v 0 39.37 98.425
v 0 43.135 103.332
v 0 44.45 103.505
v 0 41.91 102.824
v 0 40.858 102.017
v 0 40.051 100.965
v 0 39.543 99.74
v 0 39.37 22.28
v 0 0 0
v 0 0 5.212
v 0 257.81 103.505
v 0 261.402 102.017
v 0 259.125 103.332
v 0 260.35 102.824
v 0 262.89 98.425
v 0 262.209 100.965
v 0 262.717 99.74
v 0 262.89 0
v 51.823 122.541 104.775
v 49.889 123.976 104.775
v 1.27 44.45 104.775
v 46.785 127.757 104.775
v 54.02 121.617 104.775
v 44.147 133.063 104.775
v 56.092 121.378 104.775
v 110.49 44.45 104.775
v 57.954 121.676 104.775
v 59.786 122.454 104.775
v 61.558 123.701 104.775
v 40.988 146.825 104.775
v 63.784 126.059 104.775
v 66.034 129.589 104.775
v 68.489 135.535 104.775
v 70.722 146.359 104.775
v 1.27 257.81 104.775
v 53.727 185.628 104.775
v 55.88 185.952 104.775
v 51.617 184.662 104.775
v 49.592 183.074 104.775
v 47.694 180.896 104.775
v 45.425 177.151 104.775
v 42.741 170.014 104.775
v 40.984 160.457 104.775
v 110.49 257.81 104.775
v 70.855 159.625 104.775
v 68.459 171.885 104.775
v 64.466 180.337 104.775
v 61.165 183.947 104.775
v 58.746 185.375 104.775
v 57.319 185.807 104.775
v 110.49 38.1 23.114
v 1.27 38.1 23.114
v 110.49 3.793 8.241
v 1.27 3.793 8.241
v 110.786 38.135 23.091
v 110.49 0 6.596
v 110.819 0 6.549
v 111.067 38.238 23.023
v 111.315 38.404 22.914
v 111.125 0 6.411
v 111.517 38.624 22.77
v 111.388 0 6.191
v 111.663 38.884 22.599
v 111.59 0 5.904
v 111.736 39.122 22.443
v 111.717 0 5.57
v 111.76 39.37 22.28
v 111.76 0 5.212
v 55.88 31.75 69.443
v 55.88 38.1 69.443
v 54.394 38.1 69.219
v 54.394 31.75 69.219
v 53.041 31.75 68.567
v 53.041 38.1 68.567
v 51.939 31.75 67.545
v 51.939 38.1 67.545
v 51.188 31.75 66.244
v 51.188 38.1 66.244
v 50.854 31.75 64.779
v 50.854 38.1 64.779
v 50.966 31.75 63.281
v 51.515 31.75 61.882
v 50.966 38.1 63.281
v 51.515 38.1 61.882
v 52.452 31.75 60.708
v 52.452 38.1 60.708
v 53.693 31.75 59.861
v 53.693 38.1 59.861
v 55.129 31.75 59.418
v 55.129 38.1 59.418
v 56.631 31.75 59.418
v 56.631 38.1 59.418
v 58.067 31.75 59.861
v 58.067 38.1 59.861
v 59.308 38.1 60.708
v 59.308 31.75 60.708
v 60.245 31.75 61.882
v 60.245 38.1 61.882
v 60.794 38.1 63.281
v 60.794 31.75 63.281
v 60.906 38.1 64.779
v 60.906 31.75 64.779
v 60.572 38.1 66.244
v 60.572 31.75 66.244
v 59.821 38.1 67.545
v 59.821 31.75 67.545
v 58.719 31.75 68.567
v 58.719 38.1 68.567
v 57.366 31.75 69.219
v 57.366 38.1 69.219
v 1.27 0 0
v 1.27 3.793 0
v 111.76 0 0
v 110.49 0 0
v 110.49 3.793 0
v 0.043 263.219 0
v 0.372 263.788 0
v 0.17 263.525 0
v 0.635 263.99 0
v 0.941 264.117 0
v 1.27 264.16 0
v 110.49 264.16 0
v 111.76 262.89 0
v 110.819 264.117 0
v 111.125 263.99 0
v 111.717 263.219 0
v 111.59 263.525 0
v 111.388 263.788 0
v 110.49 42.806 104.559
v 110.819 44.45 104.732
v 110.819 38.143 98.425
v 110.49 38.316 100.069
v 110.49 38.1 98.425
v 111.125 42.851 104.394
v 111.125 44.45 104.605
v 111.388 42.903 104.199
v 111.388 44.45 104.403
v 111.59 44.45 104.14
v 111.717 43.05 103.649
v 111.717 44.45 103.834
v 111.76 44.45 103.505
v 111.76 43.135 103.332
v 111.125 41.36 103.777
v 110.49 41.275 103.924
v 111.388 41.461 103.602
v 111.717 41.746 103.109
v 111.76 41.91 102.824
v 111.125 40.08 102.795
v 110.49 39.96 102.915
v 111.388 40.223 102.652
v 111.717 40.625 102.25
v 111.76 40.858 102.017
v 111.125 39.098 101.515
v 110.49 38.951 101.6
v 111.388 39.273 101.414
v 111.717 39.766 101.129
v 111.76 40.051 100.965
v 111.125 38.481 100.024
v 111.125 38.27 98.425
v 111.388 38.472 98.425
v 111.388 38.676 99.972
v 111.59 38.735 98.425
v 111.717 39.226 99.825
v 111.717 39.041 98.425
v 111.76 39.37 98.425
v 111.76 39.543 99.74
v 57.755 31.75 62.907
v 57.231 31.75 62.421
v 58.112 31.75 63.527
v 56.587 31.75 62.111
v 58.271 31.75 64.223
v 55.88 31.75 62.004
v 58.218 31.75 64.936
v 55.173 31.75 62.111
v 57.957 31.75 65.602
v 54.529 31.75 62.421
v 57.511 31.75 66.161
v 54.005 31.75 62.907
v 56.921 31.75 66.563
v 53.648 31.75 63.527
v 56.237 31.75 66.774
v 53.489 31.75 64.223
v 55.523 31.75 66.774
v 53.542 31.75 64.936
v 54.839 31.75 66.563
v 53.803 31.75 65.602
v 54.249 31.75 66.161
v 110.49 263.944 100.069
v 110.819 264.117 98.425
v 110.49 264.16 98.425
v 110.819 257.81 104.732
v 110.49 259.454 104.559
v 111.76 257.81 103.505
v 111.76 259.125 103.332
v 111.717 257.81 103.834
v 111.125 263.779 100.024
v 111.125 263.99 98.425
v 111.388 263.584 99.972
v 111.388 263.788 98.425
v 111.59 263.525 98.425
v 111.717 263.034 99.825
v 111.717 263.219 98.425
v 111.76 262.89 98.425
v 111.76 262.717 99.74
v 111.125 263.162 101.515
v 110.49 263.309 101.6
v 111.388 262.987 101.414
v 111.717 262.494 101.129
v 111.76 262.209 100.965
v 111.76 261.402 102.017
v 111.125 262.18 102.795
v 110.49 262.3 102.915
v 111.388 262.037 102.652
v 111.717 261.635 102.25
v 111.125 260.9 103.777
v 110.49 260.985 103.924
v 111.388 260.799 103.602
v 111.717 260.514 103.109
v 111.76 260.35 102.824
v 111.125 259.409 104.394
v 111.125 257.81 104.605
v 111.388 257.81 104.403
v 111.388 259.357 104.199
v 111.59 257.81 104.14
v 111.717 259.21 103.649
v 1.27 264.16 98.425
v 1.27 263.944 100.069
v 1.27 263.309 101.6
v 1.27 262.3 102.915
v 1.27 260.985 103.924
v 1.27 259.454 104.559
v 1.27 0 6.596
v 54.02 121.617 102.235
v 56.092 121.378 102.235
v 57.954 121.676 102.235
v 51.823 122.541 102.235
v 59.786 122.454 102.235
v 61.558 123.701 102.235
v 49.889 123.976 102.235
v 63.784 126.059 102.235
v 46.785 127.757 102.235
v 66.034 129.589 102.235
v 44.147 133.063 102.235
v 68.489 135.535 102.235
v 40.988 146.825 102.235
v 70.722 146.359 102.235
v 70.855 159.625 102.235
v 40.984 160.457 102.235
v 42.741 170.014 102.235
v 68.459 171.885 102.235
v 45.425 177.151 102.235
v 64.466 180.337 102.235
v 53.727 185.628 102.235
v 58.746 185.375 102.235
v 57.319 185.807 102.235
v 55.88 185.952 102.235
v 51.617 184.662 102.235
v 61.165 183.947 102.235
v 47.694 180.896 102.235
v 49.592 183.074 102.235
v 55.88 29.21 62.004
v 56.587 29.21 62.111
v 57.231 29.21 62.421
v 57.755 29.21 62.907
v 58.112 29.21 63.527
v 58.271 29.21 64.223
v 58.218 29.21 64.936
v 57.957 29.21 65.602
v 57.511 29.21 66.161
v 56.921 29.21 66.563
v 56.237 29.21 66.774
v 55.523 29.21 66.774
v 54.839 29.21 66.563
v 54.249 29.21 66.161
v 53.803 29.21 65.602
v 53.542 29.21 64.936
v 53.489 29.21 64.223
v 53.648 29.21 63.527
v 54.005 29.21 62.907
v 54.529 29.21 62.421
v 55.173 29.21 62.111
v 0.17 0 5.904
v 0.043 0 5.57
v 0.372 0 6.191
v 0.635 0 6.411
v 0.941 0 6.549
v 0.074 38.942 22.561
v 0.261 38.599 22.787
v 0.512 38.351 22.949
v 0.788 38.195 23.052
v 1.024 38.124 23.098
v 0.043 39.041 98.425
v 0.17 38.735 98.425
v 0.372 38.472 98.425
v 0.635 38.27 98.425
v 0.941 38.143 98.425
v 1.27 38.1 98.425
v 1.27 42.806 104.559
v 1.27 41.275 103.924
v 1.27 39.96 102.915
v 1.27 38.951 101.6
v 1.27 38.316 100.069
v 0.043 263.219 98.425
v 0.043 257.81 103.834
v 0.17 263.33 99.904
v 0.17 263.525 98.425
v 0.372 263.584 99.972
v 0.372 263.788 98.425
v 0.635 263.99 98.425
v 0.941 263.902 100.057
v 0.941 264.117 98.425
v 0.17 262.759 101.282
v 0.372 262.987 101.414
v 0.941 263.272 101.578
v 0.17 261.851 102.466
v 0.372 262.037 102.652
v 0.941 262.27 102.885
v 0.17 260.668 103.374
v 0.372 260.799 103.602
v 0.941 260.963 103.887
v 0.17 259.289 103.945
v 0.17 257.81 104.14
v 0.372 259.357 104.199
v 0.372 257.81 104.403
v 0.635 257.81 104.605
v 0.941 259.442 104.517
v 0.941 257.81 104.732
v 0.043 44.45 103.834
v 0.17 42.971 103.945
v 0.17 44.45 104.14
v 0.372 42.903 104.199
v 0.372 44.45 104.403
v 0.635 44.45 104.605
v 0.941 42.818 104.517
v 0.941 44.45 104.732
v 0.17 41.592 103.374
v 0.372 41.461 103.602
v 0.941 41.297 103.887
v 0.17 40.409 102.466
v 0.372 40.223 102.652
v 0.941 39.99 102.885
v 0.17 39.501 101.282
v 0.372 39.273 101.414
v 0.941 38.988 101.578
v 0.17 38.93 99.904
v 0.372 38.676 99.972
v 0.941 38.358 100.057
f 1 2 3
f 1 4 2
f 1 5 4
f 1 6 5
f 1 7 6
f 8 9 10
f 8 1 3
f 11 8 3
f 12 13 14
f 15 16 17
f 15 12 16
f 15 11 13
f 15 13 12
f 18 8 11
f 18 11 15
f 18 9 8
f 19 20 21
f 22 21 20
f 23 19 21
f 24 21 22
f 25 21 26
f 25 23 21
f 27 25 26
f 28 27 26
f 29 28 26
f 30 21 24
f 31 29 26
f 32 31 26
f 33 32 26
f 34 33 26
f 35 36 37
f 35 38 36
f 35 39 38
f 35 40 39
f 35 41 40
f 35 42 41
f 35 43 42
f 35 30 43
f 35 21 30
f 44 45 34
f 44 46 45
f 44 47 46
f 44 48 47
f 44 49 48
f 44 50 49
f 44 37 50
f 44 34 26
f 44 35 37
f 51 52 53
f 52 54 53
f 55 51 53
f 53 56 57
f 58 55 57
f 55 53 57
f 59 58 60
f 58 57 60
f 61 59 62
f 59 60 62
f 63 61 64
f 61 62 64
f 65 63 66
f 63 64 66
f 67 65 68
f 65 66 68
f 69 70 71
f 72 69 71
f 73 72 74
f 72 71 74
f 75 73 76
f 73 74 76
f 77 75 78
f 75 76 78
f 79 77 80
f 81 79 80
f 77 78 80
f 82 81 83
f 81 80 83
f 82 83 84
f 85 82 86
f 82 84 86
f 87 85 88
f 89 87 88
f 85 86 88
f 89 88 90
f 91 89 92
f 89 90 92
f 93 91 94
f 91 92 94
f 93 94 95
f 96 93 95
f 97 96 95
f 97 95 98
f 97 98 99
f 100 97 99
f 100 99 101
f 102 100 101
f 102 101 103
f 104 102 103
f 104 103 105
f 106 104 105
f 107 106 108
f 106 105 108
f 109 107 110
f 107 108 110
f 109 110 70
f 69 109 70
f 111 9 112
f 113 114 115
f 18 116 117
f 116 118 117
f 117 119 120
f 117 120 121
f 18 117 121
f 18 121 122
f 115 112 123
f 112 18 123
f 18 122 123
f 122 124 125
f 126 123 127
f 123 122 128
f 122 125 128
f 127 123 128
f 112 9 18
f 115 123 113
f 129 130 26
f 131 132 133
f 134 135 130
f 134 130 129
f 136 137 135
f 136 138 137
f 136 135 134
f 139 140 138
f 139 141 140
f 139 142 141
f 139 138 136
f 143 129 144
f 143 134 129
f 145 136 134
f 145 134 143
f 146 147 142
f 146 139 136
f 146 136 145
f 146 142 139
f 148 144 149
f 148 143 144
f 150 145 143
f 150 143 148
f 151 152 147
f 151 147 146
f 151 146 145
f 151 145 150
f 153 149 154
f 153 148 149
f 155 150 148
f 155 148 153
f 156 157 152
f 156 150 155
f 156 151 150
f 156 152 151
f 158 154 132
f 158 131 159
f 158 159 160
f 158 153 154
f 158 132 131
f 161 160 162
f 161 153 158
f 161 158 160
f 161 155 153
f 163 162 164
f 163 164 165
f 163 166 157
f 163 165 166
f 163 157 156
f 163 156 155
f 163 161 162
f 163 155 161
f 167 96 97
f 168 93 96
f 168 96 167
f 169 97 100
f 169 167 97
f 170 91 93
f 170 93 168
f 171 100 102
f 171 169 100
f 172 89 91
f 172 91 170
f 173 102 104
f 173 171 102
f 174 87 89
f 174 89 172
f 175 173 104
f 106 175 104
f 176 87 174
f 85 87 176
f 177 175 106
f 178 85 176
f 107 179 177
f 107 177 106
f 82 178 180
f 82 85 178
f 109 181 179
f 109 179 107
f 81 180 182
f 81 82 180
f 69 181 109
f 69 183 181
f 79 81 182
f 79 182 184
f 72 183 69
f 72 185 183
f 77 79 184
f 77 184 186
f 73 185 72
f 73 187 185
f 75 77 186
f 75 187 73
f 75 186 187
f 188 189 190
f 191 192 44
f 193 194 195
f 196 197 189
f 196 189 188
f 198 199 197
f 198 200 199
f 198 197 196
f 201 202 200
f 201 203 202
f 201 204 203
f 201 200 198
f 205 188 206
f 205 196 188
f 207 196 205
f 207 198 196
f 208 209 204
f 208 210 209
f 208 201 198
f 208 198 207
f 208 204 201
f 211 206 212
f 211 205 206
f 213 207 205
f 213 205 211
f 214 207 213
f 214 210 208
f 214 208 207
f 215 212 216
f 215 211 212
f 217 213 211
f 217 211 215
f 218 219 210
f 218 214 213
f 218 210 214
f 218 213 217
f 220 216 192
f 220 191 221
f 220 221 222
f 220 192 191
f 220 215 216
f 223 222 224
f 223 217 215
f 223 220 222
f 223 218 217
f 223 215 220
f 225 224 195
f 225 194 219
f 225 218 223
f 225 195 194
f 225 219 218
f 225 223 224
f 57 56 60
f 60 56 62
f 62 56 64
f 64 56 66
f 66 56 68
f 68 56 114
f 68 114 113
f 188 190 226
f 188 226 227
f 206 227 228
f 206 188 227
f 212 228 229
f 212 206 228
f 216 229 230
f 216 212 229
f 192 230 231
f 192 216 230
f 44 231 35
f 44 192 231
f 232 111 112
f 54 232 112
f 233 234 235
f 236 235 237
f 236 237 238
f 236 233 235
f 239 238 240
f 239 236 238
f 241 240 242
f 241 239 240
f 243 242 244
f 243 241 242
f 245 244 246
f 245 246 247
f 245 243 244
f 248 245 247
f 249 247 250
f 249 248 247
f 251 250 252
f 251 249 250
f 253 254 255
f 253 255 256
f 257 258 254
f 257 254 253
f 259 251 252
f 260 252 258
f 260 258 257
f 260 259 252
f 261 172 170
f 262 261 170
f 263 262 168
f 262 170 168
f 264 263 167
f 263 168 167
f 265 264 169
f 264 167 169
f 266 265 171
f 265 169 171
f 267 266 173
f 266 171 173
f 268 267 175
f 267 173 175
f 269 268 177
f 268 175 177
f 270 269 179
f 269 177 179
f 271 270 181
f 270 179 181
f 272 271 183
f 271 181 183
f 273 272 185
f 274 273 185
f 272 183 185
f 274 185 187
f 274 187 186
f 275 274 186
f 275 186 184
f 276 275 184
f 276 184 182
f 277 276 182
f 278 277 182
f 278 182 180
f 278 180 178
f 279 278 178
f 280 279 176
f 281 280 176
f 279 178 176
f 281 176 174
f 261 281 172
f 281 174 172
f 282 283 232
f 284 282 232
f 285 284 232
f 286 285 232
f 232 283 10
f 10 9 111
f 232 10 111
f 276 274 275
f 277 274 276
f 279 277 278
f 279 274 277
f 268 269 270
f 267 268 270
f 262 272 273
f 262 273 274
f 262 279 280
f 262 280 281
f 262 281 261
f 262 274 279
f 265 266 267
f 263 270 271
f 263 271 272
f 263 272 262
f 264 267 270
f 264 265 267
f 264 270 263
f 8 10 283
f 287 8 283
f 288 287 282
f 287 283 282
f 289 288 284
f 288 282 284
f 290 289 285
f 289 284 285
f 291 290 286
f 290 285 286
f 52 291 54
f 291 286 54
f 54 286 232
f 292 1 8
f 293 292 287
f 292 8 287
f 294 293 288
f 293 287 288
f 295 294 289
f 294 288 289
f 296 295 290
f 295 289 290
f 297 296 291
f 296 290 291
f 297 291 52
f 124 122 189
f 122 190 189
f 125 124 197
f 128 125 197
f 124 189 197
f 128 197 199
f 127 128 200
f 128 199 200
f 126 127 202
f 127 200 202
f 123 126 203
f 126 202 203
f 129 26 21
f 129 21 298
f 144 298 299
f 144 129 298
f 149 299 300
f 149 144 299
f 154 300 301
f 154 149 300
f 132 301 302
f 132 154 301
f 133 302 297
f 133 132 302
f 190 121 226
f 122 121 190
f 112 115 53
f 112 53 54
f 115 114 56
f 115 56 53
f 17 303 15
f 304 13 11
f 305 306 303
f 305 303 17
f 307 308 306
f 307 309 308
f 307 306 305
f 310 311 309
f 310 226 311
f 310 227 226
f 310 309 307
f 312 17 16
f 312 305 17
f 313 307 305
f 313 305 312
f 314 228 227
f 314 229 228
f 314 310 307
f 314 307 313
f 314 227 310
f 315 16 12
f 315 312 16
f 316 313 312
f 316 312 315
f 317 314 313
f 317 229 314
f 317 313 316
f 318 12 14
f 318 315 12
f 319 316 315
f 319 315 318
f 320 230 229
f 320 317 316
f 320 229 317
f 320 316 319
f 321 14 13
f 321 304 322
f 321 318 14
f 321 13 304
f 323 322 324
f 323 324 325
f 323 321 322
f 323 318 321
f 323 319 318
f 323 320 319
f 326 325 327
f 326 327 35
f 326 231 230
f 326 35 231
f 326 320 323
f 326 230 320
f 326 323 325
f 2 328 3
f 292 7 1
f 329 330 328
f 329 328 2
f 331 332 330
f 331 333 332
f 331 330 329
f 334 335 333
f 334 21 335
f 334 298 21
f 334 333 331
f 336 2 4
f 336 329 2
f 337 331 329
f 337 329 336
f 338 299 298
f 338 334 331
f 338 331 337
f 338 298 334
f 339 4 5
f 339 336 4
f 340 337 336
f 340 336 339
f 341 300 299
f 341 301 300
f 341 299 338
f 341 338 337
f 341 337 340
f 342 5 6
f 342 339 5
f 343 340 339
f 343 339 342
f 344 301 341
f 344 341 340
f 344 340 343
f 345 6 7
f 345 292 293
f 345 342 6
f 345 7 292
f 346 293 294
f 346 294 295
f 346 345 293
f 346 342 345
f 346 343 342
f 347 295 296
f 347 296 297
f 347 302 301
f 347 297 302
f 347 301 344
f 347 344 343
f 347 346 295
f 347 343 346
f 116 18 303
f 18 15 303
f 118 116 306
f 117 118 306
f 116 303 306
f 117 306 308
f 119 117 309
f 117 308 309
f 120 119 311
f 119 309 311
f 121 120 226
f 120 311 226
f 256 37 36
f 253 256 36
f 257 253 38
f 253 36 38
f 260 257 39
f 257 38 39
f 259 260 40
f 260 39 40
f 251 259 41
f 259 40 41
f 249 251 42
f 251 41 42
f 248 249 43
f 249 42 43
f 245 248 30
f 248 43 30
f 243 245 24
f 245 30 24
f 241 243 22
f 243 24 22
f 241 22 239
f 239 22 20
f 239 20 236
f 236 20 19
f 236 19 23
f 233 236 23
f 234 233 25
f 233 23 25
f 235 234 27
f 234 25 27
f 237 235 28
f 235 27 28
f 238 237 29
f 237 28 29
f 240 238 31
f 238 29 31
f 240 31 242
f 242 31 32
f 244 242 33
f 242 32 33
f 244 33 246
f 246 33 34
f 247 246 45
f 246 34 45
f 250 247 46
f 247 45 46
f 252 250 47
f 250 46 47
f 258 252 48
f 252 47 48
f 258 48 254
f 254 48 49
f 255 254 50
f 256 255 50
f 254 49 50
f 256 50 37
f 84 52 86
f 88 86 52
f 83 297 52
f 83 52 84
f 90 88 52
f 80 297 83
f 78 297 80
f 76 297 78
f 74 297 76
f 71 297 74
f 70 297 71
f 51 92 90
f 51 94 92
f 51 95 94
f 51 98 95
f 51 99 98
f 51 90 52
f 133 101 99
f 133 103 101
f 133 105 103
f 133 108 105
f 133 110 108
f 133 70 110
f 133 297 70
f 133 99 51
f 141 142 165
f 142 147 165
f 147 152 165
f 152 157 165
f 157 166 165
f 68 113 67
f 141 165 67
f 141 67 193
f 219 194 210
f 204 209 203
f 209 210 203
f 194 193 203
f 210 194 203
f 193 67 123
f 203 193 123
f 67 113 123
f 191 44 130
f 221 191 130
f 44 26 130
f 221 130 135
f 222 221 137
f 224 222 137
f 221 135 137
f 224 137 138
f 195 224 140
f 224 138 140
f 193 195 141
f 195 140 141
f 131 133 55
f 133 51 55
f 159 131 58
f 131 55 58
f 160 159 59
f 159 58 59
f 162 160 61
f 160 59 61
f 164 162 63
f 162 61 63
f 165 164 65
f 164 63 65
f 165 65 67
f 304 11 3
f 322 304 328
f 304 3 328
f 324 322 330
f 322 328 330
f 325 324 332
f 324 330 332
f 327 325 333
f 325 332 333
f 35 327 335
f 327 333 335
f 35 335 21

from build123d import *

# Parameters (mm, degrees)
SKETCH1_W           = 111.76
SKETCH1_H           = 264.16
BOSS_EXTRUDE1_DEPTH = 104.77499999999999
SKETCH2_W           = 111.76
SKETCH2_H           = 38.1
CUT_EXTRUDE1_DEPTH  = 81.66099999999999
CUT_LOFT3_START     = -22
CUT_LOFT3_OUTLINE_W = 111.76
CUT_LOFT3_OUTLINE_H = 41.526476030000005
CUT_LOFT3_DEPTH     = 15.94808629
SKETCH7_W           = 109.22000000000003
SKETCH7_H           = 3.7934503700089675
CUT_EXTRUDE3_DEPTH  = 306.36634363498547
SKETCH8_RX          = 32.28826667150602
SKETCH8_RY          = 15.237159552845547
CUT_EXTRUDE4_DEPTH  = 2.54
SKETCH9_R           = 5.040527571520393
BOSS_EXTRUDE2_DEPTH = 6.35
SKETCH10_R          = 2.398168465987588
BOSS_EXTRUDE3_DEPTH = 2.54
FILLET1_R           = 6.35
FILLET2_R           = 1.27


with BuildPart() as part:
    # Sketch1 → Boss-Extrude1 (new body)
    with BuildSketch(Plane.XY):
        with Locations((55.88, 132.08)):
            Rectangle(SKETCH1_W, SKETCH1_H)
    extrude(amount=BOSS_EXTRUDE1_DEPTH)

    # Sketch2 → Cut-Extrude1 (cut)
    with BuildSketch(Plane.XY.offset(104.77499999999999)):
        with Locations((55.88, 19.05)):
            Rectangle(SKETCH2_W, SKETCH2_H)
    extrude(amount=-CUT_EXTRUDE1_DEPTH, mode=Mode.SUBTRACT)

    # Cut-Loft3: read off the stored shape, not the designer's step
    # Cut-Loft3 outline → Cut-Loft3 (cut)
    with BuildSketch(Plane(origin=(0, 0, 0), x_dir=(1, 0, 0), z_dir=(0, 0.3977658725333551, -0.9174869539387353)).offset(CUT_LOFT3_START)):
        with Locations((55.88, -23.386975308)):
            Rectangle(CUT_LOFT3_OUTLINE_W, CUT_LOFT3_OUTLINE_H)
    extrude(amount=CUT_LOFT3_DEPTH, mode=Mode.SUBTRACT)

    # Sketch7 → Cut-Extrude3 (cut, through all)
    with BuildSketch(Plane(origin=(0, 0, 0), x_dir=(-1, 0, 0), z_dir=(0, 0, -1))):
        with Locations((-55.88000000000001, 1.8967251850044837)):
            Rectangle(SKETCH7_W, SKETCH7_H)
    extrude(amount=-CUT_EXTRUDE3_DEPTH, mode=Mode.SUBTRACT)

    # Sketch8 → Cut-Extrude4 (cut)
    with BuildSketch(Plane.XY.offset(104.77499999999999)):
        with Locations(Location((55.88, 153.6634760331982), (0, 0, 90))):
            Ellipse(SKETCH8_RX, SKETCH8_RY)
    extrude(amount=-CUT_EXTRUDE4_DEPTH, mode=Mode.SUBTRACT)

    # Sketch9 → Boss-Extrude2 (add)
    with BuildSketch(Plane.XZ.offset(-38.1)):
        with Locations(Location((55.88, 64.40266714831378, 0), (0, 0, 90))):
            Circle(SKETCH9_R)
    extrude(amount=BOSS_EXTRUDE2_DEPTH)

    # Sketch10 → Boss-Extrude3 (add)
    with BuildSketch(Plane.XZ.offset(-31.75)):
        with Locations(Location((55.88, 64.40266714831378, 0), (0, 0, 270))):
            Circle(SKETCH10_R)
    extrude(amount=BOSS_EXTRUDE3_DEPTH)

    # Fillet1
    fillet1_edges = [part.edges().sort_by_distance(p)[0] for p in [
        (55.88, 264.16, 104.77499999999999),
        (55.88, 38.1, 104.77499999999999),
    ]]
    fillet(fillet1_edges, radius=FILLET1_R)

    # Fillet2
    fillet2_edges = [part.edges().sort_by_distance(p)[0] for p in [
        (0, 264.16, 49.2125),
        (0, 262.3001280605346, 102.91512806053457),
        (0, 38.1, 60.7695),
        (0, 39.959871939465415, 102.91512806053457),
        (111.76, 38.1, 60.7695),
        (111.76, 39.959871939465415, 102.91512806053457),
        (111.76, 264.16, 49.2125),
        (111.76, 262.3001280605346, 102.91512806053457),
        (0, 19.049999999822614, 14.855092514590622),
        (111.76, 19.04999999982261, 14.85509251459062),
        (0, 151.13, 104.77499999999999),
        (111.76, 151.13, 104.77499999999999),
    ]]
    fillet(fillet2_edges, radius=FILLET2_R)


solid = part.part
